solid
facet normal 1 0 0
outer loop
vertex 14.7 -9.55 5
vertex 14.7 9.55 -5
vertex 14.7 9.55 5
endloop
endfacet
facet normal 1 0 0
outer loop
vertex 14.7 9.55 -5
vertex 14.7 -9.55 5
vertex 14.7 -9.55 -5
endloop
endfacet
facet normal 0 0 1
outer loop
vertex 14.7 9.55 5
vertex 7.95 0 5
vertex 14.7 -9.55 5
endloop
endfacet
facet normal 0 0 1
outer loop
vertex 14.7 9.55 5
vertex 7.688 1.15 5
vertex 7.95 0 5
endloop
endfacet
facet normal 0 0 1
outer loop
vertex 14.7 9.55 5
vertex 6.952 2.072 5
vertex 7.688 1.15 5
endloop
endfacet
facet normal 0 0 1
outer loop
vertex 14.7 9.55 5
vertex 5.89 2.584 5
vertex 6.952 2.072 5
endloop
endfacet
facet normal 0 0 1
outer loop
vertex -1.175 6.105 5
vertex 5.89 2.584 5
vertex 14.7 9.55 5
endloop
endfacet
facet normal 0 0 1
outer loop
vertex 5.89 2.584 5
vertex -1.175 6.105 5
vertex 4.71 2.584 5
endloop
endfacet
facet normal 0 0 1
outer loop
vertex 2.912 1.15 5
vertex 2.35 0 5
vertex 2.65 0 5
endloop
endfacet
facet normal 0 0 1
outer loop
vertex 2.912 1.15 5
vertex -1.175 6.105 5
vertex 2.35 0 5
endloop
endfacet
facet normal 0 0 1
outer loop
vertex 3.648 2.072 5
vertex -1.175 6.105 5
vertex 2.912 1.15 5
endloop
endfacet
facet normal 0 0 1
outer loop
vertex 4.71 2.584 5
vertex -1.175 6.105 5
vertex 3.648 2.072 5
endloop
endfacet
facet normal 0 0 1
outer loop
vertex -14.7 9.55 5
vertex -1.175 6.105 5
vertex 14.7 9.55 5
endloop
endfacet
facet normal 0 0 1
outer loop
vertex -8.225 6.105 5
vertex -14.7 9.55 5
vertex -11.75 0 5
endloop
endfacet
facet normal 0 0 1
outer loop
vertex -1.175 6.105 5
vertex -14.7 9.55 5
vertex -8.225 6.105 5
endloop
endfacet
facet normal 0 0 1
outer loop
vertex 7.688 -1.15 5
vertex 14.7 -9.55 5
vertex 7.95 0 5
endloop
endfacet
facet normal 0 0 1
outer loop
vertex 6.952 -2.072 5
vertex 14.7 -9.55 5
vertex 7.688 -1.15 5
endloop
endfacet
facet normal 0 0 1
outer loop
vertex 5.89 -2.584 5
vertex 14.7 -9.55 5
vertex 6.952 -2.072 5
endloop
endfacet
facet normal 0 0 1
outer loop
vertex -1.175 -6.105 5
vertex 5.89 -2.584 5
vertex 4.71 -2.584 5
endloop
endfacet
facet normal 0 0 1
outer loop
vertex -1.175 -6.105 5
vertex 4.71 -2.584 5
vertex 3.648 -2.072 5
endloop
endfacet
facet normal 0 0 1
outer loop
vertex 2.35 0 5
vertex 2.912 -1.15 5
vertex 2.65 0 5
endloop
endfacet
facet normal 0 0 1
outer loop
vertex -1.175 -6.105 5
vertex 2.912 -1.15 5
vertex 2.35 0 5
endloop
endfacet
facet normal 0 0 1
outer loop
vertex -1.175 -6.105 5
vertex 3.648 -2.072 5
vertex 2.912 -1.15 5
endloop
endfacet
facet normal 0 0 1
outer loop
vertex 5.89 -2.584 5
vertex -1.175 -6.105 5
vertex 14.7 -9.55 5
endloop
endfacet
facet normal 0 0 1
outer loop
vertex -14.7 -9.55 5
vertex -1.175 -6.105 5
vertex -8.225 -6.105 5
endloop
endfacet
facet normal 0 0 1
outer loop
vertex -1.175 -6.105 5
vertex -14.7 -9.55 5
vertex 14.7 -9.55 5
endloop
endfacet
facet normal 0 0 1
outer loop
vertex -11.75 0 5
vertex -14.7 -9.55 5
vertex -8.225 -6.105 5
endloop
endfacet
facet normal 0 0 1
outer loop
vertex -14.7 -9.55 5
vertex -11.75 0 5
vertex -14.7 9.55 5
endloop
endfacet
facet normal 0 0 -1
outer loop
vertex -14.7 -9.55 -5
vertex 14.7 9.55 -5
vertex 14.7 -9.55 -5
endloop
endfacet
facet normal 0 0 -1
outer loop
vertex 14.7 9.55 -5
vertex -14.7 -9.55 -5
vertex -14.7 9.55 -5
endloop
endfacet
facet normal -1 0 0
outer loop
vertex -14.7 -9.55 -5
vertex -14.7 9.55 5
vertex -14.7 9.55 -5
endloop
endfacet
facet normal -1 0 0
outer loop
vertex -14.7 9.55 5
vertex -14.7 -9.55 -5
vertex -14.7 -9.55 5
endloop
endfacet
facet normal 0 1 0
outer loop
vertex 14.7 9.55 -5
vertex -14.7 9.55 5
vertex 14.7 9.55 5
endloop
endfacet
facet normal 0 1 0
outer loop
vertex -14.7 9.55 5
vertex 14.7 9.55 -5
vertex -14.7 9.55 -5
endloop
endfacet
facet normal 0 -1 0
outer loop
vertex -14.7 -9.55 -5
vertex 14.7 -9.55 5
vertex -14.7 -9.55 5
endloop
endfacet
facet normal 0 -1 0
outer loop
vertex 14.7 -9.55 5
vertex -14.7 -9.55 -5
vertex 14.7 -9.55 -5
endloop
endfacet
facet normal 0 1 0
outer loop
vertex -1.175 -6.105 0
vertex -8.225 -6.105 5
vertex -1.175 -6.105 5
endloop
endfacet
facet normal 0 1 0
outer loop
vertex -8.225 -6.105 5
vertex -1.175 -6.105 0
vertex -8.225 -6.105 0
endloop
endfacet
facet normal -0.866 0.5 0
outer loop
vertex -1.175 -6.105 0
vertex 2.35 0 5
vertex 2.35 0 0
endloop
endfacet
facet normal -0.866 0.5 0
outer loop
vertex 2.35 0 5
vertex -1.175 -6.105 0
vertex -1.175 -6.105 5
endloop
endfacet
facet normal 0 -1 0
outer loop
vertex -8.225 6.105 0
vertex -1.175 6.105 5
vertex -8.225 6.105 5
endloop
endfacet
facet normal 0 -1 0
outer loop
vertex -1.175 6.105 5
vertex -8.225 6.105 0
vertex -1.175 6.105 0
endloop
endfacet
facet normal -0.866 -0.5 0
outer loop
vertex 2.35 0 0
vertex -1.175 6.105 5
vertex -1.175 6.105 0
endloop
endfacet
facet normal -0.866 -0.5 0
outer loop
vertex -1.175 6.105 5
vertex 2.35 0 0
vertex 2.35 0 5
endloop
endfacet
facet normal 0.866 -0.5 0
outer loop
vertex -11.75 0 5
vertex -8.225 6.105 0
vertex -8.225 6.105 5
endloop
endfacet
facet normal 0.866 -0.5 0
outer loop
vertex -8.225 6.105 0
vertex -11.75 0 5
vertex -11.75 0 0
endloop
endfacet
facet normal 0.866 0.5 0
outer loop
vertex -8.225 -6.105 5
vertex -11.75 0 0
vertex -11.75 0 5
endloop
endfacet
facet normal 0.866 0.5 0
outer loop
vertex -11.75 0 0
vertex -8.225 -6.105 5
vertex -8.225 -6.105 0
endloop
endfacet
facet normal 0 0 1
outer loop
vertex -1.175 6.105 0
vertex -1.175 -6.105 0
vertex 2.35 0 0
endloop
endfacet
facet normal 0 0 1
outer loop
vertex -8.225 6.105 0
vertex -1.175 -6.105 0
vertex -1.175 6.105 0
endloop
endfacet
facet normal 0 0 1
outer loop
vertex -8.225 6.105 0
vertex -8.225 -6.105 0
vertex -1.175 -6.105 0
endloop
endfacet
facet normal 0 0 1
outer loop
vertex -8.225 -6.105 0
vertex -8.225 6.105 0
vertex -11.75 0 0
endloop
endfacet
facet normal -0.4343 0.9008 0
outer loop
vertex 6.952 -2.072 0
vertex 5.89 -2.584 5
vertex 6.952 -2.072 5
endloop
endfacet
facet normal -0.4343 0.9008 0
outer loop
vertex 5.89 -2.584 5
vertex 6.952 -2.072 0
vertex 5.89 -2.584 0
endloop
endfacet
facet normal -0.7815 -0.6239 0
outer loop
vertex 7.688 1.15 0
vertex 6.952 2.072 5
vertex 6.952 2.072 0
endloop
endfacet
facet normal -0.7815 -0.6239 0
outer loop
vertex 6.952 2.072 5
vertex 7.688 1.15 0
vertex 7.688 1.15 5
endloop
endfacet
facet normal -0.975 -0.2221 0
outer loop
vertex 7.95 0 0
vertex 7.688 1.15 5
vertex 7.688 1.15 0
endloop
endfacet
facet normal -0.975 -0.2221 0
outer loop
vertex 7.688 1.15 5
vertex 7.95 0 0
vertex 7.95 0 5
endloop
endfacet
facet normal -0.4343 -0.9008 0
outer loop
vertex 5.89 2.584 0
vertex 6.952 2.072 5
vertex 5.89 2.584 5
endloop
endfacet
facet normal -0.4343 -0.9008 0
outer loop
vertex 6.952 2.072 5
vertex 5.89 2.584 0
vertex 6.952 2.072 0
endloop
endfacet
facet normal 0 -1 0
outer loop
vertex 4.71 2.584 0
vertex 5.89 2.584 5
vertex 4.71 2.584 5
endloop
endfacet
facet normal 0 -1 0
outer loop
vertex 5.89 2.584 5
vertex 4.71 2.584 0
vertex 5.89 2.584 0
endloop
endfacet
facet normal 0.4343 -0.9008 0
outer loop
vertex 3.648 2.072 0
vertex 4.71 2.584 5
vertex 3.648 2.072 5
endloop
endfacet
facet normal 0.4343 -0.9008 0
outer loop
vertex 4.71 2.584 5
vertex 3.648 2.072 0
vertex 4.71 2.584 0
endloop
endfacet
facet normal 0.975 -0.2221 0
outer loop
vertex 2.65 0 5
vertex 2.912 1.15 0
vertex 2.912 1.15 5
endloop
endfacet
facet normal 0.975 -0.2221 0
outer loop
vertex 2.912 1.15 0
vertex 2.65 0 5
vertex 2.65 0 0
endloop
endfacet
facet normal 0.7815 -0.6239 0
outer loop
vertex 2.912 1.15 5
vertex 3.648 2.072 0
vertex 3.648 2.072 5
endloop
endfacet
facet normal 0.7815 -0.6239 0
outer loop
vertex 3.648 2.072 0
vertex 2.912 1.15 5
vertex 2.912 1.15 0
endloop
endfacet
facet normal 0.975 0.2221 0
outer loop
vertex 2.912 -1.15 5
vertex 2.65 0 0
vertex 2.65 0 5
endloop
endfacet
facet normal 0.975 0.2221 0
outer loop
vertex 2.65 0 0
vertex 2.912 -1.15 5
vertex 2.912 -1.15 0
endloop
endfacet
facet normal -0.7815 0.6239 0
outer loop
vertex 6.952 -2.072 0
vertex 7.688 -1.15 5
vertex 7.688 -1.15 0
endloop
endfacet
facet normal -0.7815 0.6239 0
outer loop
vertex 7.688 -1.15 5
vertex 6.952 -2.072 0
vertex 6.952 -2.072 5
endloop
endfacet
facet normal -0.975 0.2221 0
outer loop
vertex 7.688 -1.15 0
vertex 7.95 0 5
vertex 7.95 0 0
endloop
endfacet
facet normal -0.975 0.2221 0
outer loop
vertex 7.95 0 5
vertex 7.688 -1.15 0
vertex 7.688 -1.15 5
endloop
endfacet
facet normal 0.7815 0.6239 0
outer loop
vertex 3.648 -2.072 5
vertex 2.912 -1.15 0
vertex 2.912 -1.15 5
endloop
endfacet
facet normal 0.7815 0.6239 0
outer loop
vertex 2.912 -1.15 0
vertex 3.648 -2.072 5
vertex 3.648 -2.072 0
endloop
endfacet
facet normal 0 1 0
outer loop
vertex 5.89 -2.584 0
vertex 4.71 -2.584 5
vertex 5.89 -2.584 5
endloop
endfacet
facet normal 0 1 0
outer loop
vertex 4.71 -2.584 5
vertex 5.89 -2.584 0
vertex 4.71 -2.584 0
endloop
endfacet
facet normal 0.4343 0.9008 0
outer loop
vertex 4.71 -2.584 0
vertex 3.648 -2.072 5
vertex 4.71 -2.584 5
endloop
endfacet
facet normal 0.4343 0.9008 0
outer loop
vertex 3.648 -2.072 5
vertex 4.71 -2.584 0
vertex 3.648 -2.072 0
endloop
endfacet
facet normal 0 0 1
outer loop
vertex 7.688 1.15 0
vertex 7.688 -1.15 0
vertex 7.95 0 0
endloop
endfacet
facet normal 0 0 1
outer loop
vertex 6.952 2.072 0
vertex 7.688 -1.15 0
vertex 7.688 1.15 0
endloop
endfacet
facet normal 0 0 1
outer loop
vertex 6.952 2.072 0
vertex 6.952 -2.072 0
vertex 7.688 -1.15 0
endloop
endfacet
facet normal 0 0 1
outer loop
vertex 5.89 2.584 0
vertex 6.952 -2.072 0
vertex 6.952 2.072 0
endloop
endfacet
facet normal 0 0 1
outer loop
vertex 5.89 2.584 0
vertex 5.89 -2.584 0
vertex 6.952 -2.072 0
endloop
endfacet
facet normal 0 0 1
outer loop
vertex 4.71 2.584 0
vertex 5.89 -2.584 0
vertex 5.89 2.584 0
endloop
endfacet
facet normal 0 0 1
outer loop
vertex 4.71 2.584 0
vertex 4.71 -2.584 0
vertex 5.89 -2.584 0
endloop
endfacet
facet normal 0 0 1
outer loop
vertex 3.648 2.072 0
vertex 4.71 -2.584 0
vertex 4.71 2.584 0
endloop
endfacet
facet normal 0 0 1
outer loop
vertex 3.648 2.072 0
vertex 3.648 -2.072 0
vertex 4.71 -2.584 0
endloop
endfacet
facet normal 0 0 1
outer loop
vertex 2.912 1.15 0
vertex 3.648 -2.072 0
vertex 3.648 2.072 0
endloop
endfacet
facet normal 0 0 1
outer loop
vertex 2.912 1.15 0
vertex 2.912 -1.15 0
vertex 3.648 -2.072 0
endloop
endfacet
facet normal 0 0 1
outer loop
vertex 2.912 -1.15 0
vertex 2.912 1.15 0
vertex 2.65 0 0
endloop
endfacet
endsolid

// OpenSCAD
// file: prusafunc.scad
// PRUSA Mendel  
// Functions used in many files
// GNU GPL v3
// Josef Průša
// josefprusa@me.com
// prusadjs.cz
// http://www.reprap.org/wiki/Prusa_Mendel
// http://github.com/prusajr/PrusaMendel


module nut(d,h,horizontal=true){
cornerdiameter =  (d / 2) / cos (180 / 6);
cylinder(h = h, r = cornerdiameter, $fn = 6);
if(horizontal){
for(i = [1:6]){
	rotate([0,0,60*i]) translate([-cornerdiameter-0.2,0,0]) rotate([0,0,-45]) cube(size = [2,2,h]);
}}
}

// Based on nophead research
module polyhole(d,h) {
    n = max(round(2 * d),3);
    rotate([0,0,180])
        cylinder(h = h, r = (d / 2) / cos (180 / n), $fn = n);
}




module roundcorner(diameter){
	difference(){
		cube(size = [diameter,diameter,99], center = false);
		translate(v = [diameter, diameter, 0]) cylinder(h = 100, r=diameter, center=true);
	}
}
// file: configuration.scad
// miPrinter
// https://github.com/3DprintFIT/miPrinter
// Configuration
// GNU GPL v3
// Miro Hrončok

print = 200;
wall = 5;
rod = 8;
minirod = 3;
motorw = 43;
motorh = 47;
inf = 500;
bearingd = 7+1; // including 1 washer
bearingr = 11+0.5; // including clearance
layer = 0.3;
bigwasher = 30;

// RAIL: http://eshop.prodance.cz/fotocache/add/620612_1.jpg
rail = 10; // outside
raildepth = 15;

// Prusa parts
use <prusafunc.scad>;

linear = true;
lme8uu=false;
m8_diameter = 9;
m8_nut_diameter = 14.1;
m4_nut_diameter = 9;
m3_diameter = 3.6;
m3_nut_diameter = 5.3;
thin_wall = 3;
xend_width = 32;
// main file
// miPrinter
// https://github.com/3DprintFIT/miPrinter
// Calibration test
// GNU GPL v3
// Marek Žehra

include <configuration.scad>

module configurationtest(){
	difference(){
		cube([m8_nut_diameter+m3_nut_diameter+2*wall,m8_nut_diameter+wall,10], center=true);
		translate([-m8_nut_diameter/3,0,0])cylinder(r=m8_nut_diameter/2,h=6,$fs=8);
		translate([m3_nut_diameter,0,0])cylinder(r=m3_nut_diameter/2,h=5,$fs=1.2);
	}
}
configurationtest();
